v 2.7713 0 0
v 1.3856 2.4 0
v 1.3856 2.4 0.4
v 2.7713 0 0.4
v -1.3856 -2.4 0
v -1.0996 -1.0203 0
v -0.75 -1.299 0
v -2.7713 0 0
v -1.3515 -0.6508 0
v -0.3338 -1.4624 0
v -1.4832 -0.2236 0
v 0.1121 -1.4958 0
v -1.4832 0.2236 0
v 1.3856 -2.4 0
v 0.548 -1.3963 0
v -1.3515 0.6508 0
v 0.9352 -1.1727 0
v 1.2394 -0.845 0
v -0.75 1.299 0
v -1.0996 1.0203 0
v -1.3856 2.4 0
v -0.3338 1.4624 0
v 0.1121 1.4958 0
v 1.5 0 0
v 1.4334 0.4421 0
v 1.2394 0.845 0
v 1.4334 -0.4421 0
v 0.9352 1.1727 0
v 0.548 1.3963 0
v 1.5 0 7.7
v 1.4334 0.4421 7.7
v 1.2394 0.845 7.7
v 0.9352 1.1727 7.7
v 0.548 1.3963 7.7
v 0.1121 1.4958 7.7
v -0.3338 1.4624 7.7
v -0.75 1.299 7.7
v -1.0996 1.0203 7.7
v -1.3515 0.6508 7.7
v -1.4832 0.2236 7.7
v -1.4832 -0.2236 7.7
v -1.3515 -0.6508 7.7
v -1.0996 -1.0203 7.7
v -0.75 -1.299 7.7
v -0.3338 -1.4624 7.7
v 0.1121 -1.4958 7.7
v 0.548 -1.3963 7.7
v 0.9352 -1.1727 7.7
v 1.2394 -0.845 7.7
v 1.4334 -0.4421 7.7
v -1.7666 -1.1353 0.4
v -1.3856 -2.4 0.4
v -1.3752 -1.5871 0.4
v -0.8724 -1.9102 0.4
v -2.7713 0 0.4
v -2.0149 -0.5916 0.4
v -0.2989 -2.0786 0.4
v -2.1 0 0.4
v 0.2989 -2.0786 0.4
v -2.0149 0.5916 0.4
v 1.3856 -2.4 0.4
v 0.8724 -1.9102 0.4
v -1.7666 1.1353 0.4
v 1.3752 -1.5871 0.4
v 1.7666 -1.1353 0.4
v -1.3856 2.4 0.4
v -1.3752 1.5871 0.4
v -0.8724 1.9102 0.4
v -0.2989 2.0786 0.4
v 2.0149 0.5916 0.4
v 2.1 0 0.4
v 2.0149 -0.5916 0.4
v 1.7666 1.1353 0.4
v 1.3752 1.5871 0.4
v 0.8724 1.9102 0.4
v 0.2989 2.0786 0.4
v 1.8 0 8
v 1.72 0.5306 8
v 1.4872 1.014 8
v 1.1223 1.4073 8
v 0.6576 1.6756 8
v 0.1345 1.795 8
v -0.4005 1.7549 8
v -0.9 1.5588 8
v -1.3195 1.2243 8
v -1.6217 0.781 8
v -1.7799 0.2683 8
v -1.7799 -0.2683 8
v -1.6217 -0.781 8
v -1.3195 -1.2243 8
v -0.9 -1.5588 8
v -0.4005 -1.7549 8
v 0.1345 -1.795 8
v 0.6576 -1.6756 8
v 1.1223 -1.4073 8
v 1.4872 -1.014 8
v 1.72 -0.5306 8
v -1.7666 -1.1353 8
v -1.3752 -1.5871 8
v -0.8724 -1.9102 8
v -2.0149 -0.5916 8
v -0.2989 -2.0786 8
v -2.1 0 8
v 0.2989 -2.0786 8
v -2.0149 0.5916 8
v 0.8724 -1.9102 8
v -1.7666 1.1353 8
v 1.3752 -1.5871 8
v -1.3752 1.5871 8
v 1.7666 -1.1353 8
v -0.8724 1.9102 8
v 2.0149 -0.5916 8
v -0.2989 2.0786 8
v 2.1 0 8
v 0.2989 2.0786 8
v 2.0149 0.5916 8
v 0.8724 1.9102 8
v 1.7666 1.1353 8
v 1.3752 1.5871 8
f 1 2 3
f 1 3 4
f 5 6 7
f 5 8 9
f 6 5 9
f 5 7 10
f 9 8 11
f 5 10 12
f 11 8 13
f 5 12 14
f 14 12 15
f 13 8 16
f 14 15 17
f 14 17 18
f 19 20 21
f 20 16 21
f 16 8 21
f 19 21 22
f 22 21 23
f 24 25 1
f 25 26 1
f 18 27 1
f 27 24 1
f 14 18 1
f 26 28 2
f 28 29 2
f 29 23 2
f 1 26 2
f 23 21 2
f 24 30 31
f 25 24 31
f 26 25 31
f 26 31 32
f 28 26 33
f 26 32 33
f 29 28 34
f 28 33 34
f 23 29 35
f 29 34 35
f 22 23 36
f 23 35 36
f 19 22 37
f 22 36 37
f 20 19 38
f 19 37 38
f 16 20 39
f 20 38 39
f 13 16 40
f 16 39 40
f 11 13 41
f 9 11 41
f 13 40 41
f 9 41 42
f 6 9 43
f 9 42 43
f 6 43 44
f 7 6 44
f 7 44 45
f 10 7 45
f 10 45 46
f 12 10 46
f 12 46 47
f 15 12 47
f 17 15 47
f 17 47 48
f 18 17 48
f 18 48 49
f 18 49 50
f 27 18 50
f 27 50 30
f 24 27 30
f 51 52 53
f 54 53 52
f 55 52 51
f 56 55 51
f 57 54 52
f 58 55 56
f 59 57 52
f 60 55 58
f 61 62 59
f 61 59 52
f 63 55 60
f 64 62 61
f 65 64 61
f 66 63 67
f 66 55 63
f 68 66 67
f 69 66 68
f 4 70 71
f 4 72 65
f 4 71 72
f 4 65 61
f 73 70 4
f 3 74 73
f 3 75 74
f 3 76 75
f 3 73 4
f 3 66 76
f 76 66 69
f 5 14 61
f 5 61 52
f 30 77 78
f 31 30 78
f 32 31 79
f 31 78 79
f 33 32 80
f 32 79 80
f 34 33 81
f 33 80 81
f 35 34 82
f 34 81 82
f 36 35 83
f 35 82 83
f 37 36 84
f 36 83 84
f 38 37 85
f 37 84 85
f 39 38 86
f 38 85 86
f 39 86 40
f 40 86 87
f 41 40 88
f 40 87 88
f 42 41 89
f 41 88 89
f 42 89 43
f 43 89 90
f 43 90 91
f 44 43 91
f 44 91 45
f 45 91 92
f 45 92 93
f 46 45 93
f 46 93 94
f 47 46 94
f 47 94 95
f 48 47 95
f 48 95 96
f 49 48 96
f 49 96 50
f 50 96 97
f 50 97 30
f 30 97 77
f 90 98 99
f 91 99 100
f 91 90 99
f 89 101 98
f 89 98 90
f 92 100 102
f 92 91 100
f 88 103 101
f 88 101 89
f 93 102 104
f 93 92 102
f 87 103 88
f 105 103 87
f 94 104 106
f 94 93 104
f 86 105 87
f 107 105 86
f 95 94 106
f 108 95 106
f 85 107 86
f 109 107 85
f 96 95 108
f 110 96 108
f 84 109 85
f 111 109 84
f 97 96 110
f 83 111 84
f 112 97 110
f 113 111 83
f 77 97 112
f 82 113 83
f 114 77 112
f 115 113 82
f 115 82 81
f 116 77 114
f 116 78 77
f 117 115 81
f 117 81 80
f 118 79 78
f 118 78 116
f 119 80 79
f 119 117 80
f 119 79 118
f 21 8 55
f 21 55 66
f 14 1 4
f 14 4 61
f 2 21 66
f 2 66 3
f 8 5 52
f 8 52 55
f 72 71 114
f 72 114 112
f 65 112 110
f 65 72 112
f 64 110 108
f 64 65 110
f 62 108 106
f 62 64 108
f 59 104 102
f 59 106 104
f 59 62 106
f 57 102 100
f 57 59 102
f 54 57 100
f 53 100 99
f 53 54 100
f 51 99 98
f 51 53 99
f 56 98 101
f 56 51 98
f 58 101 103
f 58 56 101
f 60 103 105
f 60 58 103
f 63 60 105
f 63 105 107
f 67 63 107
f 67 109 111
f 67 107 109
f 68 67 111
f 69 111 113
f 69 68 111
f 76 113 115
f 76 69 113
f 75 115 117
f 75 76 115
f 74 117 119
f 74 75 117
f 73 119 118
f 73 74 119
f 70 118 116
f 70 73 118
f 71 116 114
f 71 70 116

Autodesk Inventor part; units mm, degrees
ref_plane "YZ Plane" through (0, 0, 0) normal (1, 0, 0) x (0, 1, 0)
ref_plane "XZ Plane" through (0, 0, 0) normal (0, 1, 0) x (-1, 0, 0)
ref_plane "XY Plane" through (0, 0, 0) normal (0, 0, 1) x (1, 0, 0)
sketch "Sketch1" plane through (0, 0, 0) normal (0, 0, 1) x (1, 0, 0)
  line L0 (1.3856, 2.4) -> (2.7713, 0)
  line L1 (2.7713, 0) -> (1.3856, -2.4)
  line L2 (1.3856, -2.4) -> (-1.3856, -2.4)
  line L3 (-1.3856, -2.4) -> (-2.7713, 0)
  line L4 (-2.7713, 0) -> (-1.3856, 2.4)
  line L5 (-1.3856, 2.4) -> (1.3856, 2.4)
  point P0 (0, 0)
  dimension "d0" = 4.8
extrude "Extrusion1" add sketch "Sketch1" along normal blind 0.4
sketch "Sketch2" plane through (0, 0, 0.4) normal (0, 0, 1) x (1, 0, 0)
  circle A0 centre (0, 0) radius 2.1
  dimension "d3" = 4.2
extrude "Extrusion2" add sketch "Sketch2" along normal blind 7.6
sketch "Sketch3" plane through (0, 0, 8) normal (0, 0, 1) x (1, 0, 0)
  circle A0 centre (0, 0) radius 2.1 projected
  circle A1 centre (0, 0) radius 1.5
  dimension "d6" = 3
extrude "Extrusion3" cut sketch "Sketch3" against normal blind 10 contours A1
chamfer "Chamfer1" distance 0.3 angle 45 1 edges at (-1.5, 0, 8)
thread "Thread1" size "M3x0.5" class "6H" standard "ANSI Metric M Profile" full length
properties part number "Вытяжная заклепка_Р-Ш-М3" material "Сталь низкоуглеродистая"
